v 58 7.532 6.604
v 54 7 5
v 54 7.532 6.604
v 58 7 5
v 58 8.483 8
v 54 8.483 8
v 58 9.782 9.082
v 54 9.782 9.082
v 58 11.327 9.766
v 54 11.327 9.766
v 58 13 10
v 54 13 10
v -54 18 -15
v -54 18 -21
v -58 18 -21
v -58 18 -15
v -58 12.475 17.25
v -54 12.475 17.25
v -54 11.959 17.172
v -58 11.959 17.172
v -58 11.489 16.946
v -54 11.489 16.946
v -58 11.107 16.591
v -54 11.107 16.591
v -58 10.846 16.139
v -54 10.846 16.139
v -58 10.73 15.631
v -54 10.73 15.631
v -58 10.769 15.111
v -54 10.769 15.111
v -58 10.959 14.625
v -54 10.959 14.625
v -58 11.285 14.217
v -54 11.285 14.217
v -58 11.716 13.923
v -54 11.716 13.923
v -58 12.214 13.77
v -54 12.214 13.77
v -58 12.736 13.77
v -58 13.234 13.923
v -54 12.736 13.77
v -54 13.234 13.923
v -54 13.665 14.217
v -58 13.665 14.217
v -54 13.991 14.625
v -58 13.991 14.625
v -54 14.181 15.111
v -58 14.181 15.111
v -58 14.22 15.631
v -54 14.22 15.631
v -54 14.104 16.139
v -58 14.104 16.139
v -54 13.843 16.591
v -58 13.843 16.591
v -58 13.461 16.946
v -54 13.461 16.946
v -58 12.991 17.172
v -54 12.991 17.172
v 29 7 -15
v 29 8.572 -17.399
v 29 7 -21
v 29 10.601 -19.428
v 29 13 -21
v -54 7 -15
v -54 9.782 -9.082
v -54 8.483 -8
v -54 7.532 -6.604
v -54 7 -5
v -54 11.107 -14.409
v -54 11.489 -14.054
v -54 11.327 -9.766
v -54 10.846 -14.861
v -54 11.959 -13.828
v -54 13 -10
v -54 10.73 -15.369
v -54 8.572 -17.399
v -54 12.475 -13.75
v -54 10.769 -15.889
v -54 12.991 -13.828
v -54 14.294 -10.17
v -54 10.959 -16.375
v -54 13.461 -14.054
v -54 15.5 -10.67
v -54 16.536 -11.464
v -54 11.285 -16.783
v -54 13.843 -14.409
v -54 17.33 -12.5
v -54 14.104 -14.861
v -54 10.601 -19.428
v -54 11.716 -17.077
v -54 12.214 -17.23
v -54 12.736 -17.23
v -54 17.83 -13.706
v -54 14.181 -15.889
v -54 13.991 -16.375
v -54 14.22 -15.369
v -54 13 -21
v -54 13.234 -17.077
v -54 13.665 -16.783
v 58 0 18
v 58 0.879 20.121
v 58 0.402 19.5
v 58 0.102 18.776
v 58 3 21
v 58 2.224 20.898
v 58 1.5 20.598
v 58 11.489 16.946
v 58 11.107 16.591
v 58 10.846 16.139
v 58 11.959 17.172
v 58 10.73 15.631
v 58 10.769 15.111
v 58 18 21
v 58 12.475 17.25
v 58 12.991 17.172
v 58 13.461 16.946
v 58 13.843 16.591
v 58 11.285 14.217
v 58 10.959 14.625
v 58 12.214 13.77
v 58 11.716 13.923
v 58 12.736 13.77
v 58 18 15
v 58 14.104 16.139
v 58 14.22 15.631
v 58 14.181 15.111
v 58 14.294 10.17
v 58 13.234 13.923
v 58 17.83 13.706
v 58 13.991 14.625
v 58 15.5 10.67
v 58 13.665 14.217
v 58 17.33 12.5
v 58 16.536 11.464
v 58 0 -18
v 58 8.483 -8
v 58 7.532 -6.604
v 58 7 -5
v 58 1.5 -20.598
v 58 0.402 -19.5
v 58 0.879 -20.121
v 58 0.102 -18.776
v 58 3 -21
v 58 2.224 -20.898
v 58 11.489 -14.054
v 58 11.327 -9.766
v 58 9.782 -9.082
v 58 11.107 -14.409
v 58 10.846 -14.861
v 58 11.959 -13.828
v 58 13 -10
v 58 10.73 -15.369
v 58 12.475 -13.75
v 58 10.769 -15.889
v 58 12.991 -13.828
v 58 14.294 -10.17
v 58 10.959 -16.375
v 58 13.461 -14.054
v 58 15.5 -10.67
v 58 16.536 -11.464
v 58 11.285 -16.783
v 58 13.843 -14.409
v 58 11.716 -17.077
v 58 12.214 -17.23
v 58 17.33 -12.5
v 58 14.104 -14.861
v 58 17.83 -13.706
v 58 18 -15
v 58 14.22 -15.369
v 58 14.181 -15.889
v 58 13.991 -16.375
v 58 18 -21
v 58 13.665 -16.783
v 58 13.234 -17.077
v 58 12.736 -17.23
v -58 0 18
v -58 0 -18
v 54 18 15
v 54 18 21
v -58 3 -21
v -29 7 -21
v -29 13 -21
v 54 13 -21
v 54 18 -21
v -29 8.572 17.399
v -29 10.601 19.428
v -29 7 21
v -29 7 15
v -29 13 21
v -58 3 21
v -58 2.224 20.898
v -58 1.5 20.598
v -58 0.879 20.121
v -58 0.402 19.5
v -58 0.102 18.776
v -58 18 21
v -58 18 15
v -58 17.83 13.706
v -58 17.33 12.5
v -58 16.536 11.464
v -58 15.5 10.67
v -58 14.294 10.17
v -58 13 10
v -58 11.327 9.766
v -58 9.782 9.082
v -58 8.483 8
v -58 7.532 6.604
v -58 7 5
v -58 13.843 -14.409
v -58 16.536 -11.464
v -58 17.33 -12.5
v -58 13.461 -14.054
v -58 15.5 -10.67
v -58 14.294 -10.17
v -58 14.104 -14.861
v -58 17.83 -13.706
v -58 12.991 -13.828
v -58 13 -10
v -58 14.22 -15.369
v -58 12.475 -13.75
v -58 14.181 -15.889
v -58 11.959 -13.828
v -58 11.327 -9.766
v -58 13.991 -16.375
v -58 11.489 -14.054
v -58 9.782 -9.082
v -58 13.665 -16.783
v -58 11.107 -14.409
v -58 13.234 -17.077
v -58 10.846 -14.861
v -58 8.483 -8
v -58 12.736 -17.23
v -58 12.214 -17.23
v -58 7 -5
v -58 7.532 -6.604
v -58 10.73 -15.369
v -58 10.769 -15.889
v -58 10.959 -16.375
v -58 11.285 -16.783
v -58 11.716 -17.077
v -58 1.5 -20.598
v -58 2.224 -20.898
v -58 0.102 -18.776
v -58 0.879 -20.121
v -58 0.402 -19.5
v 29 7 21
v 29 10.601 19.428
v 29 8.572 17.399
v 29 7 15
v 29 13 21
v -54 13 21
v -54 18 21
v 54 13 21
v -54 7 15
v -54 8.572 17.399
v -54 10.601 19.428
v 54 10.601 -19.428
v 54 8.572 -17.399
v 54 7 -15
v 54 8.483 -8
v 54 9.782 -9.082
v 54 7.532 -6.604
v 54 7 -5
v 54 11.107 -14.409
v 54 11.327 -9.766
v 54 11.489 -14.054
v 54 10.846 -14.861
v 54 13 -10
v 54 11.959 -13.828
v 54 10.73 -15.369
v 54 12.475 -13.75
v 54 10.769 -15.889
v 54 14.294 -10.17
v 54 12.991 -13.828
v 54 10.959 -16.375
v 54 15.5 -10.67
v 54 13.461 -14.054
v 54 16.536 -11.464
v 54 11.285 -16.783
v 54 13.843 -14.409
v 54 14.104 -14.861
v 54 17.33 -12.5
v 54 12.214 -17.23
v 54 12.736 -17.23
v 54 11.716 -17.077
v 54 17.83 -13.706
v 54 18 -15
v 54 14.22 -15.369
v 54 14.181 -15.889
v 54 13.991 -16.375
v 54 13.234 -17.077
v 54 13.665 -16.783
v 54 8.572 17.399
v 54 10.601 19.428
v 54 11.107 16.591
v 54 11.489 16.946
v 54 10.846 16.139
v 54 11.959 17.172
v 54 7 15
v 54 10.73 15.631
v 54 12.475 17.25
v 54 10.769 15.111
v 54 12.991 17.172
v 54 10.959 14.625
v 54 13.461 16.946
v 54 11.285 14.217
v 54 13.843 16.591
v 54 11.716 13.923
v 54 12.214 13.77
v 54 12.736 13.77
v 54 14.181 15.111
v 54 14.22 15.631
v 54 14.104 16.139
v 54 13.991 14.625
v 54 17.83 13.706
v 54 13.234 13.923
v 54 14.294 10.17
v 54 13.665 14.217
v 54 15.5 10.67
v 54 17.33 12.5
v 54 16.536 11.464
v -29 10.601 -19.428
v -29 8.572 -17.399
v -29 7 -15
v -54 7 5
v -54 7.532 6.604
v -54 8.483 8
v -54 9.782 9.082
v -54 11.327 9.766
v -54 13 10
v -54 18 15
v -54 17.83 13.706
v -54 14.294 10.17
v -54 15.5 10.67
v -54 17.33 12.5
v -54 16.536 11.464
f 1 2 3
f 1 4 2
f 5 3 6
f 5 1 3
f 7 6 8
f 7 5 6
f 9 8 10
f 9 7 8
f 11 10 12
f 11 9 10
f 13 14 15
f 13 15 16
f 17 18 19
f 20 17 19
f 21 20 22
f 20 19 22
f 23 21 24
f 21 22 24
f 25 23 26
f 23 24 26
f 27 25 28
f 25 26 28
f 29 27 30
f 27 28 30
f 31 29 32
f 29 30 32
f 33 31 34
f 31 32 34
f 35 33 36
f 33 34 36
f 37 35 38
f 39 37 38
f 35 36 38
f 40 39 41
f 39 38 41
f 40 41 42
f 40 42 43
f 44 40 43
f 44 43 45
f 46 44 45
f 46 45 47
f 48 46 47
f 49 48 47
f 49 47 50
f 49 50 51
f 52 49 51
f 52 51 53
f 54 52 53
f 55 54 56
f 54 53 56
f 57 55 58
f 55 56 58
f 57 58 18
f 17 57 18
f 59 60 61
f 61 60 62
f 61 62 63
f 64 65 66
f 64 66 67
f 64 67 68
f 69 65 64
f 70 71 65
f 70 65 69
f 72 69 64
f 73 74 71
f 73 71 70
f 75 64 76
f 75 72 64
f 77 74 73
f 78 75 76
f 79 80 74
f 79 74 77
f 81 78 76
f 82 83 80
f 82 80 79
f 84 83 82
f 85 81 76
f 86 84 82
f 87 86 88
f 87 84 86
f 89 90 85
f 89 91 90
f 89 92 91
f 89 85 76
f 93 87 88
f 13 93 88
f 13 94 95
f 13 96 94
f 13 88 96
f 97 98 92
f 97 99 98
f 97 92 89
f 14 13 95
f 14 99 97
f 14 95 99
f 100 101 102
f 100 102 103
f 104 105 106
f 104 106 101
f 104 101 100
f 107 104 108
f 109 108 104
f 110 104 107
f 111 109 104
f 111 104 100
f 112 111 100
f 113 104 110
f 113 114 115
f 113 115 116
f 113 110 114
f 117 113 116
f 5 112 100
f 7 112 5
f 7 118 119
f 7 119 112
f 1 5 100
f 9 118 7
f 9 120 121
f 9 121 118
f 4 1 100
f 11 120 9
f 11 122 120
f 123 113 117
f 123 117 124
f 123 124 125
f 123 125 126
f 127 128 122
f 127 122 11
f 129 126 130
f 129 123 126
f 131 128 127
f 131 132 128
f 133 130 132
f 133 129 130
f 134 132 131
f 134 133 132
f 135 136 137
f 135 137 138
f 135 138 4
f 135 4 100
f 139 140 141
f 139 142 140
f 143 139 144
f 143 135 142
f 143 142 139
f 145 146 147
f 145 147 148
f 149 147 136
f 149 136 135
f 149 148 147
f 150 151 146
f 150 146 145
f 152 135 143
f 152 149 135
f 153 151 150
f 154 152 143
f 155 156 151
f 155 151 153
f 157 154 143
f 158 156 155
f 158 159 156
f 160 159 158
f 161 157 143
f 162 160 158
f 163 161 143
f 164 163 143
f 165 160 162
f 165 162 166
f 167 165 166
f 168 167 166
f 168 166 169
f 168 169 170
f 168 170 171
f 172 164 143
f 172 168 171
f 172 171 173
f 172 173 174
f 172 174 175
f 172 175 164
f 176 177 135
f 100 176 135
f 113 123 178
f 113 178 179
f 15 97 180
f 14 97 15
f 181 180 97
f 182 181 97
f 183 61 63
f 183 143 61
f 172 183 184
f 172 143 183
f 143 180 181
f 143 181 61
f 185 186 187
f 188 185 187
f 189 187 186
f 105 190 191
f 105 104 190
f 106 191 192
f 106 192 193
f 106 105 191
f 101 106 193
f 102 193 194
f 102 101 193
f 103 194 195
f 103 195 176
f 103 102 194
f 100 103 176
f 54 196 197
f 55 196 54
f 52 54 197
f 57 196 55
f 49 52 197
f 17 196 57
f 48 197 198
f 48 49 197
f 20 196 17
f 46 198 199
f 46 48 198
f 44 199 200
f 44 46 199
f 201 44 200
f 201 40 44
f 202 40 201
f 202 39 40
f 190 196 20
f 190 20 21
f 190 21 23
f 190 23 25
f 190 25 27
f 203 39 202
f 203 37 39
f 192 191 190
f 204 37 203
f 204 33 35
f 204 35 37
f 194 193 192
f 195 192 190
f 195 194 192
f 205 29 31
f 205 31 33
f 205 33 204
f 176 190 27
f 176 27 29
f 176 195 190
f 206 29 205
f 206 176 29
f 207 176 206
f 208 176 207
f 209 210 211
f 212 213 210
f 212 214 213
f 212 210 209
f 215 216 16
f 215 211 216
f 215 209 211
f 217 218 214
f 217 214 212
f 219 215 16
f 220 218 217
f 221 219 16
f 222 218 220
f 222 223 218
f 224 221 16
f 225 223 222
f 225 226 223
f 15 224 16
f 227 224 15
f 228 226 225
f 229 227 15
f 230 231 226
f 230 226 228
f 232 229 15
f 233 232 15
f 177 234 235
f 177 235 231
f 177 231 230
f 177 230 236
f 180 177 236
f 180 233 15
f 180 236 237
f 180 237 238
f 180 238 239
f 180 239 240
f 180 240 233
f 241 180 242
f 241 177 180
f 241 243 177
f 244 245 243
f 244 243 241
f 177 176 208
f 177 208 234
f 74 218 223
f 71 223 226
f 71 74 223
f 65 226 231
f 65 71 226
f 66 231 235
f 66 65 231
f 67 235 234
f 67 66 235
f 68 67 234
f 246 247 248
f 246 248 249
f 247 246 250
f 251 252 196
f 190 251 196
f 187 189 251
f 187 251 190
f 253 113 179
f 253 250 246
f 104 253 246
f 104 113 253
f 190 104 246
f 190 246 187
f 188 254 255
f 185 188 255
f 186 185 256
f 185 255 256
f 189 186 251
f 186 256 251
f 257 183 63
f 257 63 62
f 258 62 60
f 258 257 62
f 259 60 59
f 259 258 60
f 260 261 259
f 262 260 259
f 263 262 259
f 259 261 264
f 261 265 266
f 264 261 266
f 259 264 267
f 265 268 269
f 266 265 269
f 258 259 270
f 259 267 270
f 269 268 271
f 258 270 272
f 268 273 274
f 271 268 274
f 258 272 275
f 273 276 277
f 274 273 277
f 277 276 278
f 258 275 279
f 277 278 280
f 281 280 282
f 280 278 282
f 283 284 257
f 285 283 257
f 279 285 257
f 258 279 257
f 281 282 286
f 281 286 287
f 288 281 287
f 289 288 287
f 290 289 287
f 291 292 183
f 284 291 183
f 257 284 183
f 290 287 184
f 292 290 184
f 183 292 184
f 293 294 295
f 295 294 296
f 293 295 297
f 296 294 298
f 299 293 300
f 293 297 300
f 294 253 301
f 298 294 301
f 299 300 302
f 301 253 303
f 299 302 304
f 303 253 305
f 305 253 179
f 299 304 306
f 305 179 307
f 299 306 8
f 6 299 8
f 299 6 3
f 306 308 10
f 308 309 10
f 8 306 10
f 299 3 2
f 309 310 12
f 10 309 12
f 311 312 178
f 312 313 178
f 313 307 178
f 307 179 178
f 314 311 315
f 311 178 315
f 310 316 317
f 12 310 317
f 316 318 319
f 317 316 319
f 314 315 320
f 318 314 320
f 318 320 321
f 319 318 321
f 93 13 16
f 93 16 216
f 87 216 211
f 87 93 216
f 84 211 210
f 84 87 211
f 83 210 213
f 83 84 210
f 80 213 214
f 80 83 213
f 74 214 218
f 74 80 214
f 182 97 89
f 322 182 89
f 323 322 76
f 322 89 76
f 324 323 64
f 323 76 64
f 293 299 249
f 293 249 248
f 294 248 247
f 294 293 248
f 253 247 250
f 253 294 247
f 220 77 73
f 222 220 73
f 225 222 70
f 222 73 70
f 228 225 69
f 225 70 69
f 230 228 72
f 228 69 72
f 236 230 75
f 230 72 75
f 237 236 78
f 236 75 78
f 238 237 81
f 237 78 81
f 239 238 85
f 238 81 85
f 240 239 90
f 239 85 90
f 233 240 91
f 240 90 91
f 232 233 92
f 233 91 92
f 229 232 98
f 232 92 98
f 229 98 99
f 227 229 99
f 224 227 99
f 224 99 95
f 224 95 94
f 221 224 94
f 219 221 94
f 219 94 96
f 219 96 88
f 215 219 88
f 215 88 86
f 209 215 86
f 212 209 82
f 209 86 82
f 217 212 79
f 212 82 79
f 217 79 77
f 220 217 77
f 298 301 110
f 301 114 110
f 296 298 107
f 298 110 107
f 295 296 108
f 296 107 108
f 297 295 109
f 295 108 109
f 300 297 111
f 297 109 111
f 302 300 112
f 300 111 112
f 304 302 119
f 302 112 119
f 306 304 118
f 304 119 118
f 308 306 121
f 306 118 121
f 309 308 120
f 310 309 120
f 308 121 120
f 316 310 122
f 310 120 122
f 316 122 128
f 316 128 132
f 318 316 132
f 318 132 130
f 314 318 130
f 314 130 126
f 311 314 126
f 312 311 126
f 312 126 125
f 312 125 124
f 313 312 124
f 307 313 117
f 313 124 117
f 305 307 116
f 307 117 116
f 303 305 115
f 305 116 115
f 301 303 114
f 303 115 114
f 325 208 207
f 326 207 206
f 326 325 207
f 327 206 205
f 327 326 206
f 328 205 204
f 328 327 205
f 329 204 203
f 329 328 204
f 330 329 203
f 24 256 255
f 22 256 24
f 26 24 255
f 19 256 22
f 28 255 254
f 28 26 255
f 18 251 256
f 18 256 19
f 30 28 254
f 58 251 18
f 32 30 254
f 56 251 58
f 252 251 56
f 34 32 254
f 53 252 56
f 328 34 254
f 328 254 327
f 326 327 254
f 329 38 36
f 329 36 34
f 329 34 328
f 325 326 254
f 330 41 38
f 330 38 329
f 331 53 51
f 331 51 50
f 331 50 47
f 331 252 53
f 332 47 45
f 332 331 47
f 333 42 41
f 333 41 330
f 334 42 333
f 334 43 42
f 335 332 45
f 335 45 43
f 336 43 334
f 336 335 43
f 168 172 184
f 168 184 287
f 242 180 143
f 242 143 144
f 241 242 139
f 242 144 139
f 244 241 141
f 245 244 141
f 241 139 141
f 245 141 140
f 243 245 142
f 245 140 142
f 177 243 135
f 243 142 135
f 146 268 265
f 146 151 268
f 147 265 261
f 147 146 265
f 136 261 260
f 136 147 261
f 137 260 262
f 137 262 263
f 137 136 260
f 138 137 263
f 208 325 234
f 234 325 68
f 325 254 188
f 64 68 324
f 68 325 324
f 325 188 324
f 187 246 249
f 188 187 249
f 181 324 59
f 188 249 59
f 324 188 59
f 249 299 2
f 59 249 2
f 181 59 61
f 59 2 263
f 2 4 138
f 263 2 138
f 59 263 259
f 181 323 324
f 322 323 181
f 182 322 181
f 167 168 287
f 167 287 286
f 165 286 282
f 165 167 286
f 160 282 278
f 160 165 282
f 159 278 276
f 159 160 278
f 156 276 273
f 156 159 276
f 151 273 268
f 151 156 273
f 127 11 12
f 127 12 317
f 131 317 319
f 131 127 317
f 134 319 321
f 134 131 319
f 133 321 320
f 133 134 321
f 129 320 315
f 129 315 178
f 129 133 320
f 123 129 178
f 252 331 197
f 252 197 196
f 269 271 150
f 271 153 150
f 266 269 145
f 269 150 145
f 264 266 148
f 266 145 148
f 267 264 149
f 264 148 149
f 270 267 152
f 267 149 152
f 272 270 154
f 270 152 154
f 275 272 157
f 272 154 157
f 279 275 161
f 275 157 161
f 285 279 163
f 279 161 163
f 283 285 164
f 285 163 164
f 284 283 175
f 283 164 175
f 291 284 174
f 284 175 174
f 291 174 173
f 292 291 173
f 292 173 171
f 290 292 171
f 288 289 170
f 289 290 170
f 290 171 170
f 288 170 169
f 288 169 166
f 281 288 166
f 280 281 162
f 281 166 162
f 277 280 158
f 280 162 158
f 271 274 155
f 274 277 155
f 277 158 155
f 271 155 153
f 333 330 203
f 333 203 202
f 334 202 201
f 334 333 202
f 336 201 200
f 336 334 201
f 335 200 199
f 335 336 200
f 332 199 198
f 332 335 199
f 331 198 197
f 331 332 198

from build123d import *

# Parameters (mm, degrees)
SKETCH1_W                       = 116
SKETCH1_H                       = 42
BOSS_EXTRUDE1_DEPTH             = 7
BOSS_EXTRUDE2_REACH             = 64.081
SKETCH2_R                       = 1.75
BOSS_EXTRUDE2_DIRECTION_2_REACH = 64.081
SKETCH2_3_R                     = 1.75
CUT_EXTRUDE1_DEPTH              = 54
BOSS_EXTRUDE3_DEPTH             = 25
FILLET1_R                       = 3


with BuildPart() as part:
    # Sketch1 → Boss-Extrude1 (new body)
    with BuildSketch(Plane(origin=(0, 0, 0), x_dir=(1, 0, 0), z_dir=(0, 1, 0))):
        Rectangle(SKETCH1_W, SKETCH1_H)
    extrude(amount=BOSS_EXTRUDE1_DEPTH)

    # Boss-Extrude2: up to this face of the body (flat: up to its plane)
    boss_extrude2_end = Plane(part.part.faces().sort_by_distance((58, 3.5, 0))[0])
    # Sketch2 → Boss-Extrude2 (add, up to the picked face)
    with BuildSketch(Plane(origin=(0, 0, 0), x_dir=(0, 0, -1), z_dir=(1, 0, 0)), mode=Mode.PRIVATE) as boss_extrude2_sk1:
        with BuildLine():
            Line((-21, 18), (-21, 7))
            Line((-21, 7), (-5, 7))
            ThreePointArc((-5, 7), (-8.586149806, 9.094875162), (-10, 13))
            ThreePointArc((-10, 13), (-11.464466094, 16.535533906), (-15, 18))
            Line((-15, 18), (-21, 18))
        make_face()
        with Locations((-15.5, 12.475)):
            Circle(SKETCH2_R, mode=Mode.SUBTRACT)
    boss_extrude2_tool1 = split(extrude(boss_extrude2_sk1.sketch, amount=BOSS_EXTRUDE2_REACH, mode=Mode.PRIVATE), bisect_by=boss_extrude2_end, keep=Keep.BOTH, mode=Mode.PRIVATE)
    # Sketch2 → Boss-Extrude2 (add, up to the picked face)
    with BuildSketch(Plane(origin=(0, 0, 0), x_dir=(0, 0, -1), z_dir=(1, 0, 0)), mode=Mode.PRIVATE) as boss_extrude2_sk2:
        with BuildLine():
            ThreePointArc((10, 13), (8.586149806, 9.094875162), (5, 7))
            Line((5, 7), (21, 7))
            Line((21, 7), (21, 18))
            Line((21, 18), (15, 18))
            ThreePointArc((15, 18), (11.464466094, 16.535533906), (10, 13))
        make_face()
        with Locations((15.5, 12.475)):
            Circle(SKETCH2_R, mode=Mode.SUBTRACT)
    boss_extrude2_tool2 = split(extrude(boss_extrude2_sk2.sketch, amount=BOSS_EXTRUDE2_REACH, mode=Mode.PRIVATE), bisect_by=boss_extrude2_end, keep=Keep.BOTH, mode=Mode.PRIVATE)
    add(boss_extrude2_tool1.solids().sort_by(Axis((0, 12.5, 20.805835), (1, 0, 0)))[0])
    add(boss_extrude2_tool2.solids().sort_by(Axis((0, 12.5, -20.805835), (1, 0, 0)))[0])

    # Boss-Extrude2 direction 2: up to this face of the body (flat: up to its plane)
    boss_extrude2_direction_2_end = Plane(part.part.faces().sort_by_distance((-58, 3.5, 0))[0])
    # Sketch2 → Boss-Extrude2 direction 2 (add, up to the picked face)
    with BuildSketch(Plane(origin=(0, 0, 0), x_dir=(0, 0, -1), z_dir=(1, 0, 0)), mode=Mode.PRIVATE) as boss_extrude2_direction_2_sk1:
        with BuildLine():
            Line((-21, 18), (-21, 7))
            Line((-21, 7), (-5, 7))
            ThreePointArc((-5, 7), (-8.586149806, 9.094875162), (-10, 13))
            ThreePointArc((-10, 13), (-11.464466094, 16.535533906), (-15, 18))
            Line((-15, 18), (-21, 18))
        make_face()
        with Locations((-15.5, 12.475)):
            Circle(SKETCH2_R, mode=Mode.SUBTRACT)
    boss_extrude2_direction_2_tool1 = split(extrude(boss_extrude2_direction_2_sk1.sketch, amount=-BOSS_EXTRUDE2_DIRECTION_2_REACH, mode=Mode.PRIVATE), bisect_by=boss_extrude2_direction_2_end, keep=Keep.BOTH, mode=Mode.PRIVATE)
    # Sketch2 → Boss-Extrude2 direction 2 (add, up to the picked face)
    with BuildSketch(Plane(origin=(0, 0, 0), x_dir=(0, 0, -1), z_dir=(1, 0, 0)), mode=Mode.PRIVATE) as boss_extrude2_direction_2_sk2:
        with BuildLine():
            ThreePointArc((10, 13), (8.586149806, 9.094875162), (5, 7))
            Line((5, 7), (21, 7))
            Line((21, 7), (21, 18))
            Line((21, 18), (15, 18))
            ThreePointArc((15, 18), (11.464466094, 16.535533906), (10, 13))
        make_face()
        with Locations((15.5, 12.475)):
            Circle(SKETCH2_R, mode=Mode.SUBTRACT)
    boss_extrude2_direction_2_tool2 = split(extrude(boss_extrude2_direction_2_sk2.sketch, amount=-BOSS_EXTRUDE2_DIRECTION_2_REACH, mode=Mode.PRIVATE), bisect_by=boss_extrude2_direction_2_end, keep=Keep.BOTH, mode=Mode.PRIVATE)
    add(boss_extrude2_direction_2_tool1.solids().sort_by(Axis((0, 12.5, 20.805835), (-1, 0, 0)))[0])
    add(boss_extrude2_direction_2_tool2.solids().sort_by(Axis((0, 12.5, -20.805835), (-1, 0, 0)))[0])

    # Sketch2<3> → Cut-Extrude1 (cut, symmetric)
    # profile 1 of 2: a face of its own
    with BuildSketch(Plane(origin=(0, 0, 0), x_dir=(0, 0, -1), z_dir=(1, 0, 0))):
        with BuildLine():
            Line((-21, 18), (-21, 7))
            Line((-21, 7), (-5, 7))
            ThreePointArc((-5, 7), (-8.586149806, 9.094875162), (-10, 13))
            ThreePointArc((-10, 13), (-11.464466094, 16.535533906), (-15, 18))
            Line((-15, 18), (-21, 18))
        make_face()
        with Locations((-15.5, 12.475)):
            Circle(SKETCH2_3_R, mode=Mode.SUBTRACT)
    # profile 2 of 2: a face of its own
    with BuildSketch(Plane(origin=(0, 0, 0), x_dir=(0, 0, -1), z_dir=(1, 0, 0))):
        with BuildLine():
            ThreePointArc((10, 13), (8.586149806, 9.094875162), (5, 7))
            Line((5, 7), (21, 7))
            Line((21, 7), (21, 18))
            Line((21, 18), (15, 18))
            ThreePointArc((15, 18), (11.464466094, 16.535533906), (10, 13))
        make_face()
        with Locations((15.5, 12.475)):
            Circle(SKETCH2_3_R, mode=Mode.SUBTRACT)
    extrude(amount=CUT_EXTRUDE1_DEPTH, both=True, mode=Mode.SUBTRACT)

    # Sketch3 → Boss-Extrude3 (add)
    with BuildSketch(Plane(origin=(-54, 0, 0), x_dir=(0, 0, -1), z_dir=(1, 0, 0))):
        with BuildLine():
            Line((-21, 7), (-15, 7))
            ThreePointArc((-15, 7), (-18.465513805, 9.534486195), (-21, 13))
            Line((-21, 13), (-21, 7))
        make_face()
        with BuildLine():
            Line((21, 7), (21, 13))
            ThreePointArc((21, 13), (18.465513805, 9.534486195), (15, 7))
            Line((15, 7), (21, 7))
        make_face()
    boss_extrude3 = extrude(amount=BOSS_EXTRUDE3_DEPTH)

    # Mirror4: Boss-Extrude3 across plane
    add(boss_extrude3.mirror(Plane(origin=(0, 0, 0), x_dir=(0, 0, 1), z_dir=(1, 0, 0))))

    # Fillet1
    fillet1_edges = [part.edges().sort_by_distance(p)[0] for p in [
        (0, 0, 21),
        (0, 0, -21),
    ]]
    fillet(fillet1_edges, radius=FILLET1_R)


solid = part.part
